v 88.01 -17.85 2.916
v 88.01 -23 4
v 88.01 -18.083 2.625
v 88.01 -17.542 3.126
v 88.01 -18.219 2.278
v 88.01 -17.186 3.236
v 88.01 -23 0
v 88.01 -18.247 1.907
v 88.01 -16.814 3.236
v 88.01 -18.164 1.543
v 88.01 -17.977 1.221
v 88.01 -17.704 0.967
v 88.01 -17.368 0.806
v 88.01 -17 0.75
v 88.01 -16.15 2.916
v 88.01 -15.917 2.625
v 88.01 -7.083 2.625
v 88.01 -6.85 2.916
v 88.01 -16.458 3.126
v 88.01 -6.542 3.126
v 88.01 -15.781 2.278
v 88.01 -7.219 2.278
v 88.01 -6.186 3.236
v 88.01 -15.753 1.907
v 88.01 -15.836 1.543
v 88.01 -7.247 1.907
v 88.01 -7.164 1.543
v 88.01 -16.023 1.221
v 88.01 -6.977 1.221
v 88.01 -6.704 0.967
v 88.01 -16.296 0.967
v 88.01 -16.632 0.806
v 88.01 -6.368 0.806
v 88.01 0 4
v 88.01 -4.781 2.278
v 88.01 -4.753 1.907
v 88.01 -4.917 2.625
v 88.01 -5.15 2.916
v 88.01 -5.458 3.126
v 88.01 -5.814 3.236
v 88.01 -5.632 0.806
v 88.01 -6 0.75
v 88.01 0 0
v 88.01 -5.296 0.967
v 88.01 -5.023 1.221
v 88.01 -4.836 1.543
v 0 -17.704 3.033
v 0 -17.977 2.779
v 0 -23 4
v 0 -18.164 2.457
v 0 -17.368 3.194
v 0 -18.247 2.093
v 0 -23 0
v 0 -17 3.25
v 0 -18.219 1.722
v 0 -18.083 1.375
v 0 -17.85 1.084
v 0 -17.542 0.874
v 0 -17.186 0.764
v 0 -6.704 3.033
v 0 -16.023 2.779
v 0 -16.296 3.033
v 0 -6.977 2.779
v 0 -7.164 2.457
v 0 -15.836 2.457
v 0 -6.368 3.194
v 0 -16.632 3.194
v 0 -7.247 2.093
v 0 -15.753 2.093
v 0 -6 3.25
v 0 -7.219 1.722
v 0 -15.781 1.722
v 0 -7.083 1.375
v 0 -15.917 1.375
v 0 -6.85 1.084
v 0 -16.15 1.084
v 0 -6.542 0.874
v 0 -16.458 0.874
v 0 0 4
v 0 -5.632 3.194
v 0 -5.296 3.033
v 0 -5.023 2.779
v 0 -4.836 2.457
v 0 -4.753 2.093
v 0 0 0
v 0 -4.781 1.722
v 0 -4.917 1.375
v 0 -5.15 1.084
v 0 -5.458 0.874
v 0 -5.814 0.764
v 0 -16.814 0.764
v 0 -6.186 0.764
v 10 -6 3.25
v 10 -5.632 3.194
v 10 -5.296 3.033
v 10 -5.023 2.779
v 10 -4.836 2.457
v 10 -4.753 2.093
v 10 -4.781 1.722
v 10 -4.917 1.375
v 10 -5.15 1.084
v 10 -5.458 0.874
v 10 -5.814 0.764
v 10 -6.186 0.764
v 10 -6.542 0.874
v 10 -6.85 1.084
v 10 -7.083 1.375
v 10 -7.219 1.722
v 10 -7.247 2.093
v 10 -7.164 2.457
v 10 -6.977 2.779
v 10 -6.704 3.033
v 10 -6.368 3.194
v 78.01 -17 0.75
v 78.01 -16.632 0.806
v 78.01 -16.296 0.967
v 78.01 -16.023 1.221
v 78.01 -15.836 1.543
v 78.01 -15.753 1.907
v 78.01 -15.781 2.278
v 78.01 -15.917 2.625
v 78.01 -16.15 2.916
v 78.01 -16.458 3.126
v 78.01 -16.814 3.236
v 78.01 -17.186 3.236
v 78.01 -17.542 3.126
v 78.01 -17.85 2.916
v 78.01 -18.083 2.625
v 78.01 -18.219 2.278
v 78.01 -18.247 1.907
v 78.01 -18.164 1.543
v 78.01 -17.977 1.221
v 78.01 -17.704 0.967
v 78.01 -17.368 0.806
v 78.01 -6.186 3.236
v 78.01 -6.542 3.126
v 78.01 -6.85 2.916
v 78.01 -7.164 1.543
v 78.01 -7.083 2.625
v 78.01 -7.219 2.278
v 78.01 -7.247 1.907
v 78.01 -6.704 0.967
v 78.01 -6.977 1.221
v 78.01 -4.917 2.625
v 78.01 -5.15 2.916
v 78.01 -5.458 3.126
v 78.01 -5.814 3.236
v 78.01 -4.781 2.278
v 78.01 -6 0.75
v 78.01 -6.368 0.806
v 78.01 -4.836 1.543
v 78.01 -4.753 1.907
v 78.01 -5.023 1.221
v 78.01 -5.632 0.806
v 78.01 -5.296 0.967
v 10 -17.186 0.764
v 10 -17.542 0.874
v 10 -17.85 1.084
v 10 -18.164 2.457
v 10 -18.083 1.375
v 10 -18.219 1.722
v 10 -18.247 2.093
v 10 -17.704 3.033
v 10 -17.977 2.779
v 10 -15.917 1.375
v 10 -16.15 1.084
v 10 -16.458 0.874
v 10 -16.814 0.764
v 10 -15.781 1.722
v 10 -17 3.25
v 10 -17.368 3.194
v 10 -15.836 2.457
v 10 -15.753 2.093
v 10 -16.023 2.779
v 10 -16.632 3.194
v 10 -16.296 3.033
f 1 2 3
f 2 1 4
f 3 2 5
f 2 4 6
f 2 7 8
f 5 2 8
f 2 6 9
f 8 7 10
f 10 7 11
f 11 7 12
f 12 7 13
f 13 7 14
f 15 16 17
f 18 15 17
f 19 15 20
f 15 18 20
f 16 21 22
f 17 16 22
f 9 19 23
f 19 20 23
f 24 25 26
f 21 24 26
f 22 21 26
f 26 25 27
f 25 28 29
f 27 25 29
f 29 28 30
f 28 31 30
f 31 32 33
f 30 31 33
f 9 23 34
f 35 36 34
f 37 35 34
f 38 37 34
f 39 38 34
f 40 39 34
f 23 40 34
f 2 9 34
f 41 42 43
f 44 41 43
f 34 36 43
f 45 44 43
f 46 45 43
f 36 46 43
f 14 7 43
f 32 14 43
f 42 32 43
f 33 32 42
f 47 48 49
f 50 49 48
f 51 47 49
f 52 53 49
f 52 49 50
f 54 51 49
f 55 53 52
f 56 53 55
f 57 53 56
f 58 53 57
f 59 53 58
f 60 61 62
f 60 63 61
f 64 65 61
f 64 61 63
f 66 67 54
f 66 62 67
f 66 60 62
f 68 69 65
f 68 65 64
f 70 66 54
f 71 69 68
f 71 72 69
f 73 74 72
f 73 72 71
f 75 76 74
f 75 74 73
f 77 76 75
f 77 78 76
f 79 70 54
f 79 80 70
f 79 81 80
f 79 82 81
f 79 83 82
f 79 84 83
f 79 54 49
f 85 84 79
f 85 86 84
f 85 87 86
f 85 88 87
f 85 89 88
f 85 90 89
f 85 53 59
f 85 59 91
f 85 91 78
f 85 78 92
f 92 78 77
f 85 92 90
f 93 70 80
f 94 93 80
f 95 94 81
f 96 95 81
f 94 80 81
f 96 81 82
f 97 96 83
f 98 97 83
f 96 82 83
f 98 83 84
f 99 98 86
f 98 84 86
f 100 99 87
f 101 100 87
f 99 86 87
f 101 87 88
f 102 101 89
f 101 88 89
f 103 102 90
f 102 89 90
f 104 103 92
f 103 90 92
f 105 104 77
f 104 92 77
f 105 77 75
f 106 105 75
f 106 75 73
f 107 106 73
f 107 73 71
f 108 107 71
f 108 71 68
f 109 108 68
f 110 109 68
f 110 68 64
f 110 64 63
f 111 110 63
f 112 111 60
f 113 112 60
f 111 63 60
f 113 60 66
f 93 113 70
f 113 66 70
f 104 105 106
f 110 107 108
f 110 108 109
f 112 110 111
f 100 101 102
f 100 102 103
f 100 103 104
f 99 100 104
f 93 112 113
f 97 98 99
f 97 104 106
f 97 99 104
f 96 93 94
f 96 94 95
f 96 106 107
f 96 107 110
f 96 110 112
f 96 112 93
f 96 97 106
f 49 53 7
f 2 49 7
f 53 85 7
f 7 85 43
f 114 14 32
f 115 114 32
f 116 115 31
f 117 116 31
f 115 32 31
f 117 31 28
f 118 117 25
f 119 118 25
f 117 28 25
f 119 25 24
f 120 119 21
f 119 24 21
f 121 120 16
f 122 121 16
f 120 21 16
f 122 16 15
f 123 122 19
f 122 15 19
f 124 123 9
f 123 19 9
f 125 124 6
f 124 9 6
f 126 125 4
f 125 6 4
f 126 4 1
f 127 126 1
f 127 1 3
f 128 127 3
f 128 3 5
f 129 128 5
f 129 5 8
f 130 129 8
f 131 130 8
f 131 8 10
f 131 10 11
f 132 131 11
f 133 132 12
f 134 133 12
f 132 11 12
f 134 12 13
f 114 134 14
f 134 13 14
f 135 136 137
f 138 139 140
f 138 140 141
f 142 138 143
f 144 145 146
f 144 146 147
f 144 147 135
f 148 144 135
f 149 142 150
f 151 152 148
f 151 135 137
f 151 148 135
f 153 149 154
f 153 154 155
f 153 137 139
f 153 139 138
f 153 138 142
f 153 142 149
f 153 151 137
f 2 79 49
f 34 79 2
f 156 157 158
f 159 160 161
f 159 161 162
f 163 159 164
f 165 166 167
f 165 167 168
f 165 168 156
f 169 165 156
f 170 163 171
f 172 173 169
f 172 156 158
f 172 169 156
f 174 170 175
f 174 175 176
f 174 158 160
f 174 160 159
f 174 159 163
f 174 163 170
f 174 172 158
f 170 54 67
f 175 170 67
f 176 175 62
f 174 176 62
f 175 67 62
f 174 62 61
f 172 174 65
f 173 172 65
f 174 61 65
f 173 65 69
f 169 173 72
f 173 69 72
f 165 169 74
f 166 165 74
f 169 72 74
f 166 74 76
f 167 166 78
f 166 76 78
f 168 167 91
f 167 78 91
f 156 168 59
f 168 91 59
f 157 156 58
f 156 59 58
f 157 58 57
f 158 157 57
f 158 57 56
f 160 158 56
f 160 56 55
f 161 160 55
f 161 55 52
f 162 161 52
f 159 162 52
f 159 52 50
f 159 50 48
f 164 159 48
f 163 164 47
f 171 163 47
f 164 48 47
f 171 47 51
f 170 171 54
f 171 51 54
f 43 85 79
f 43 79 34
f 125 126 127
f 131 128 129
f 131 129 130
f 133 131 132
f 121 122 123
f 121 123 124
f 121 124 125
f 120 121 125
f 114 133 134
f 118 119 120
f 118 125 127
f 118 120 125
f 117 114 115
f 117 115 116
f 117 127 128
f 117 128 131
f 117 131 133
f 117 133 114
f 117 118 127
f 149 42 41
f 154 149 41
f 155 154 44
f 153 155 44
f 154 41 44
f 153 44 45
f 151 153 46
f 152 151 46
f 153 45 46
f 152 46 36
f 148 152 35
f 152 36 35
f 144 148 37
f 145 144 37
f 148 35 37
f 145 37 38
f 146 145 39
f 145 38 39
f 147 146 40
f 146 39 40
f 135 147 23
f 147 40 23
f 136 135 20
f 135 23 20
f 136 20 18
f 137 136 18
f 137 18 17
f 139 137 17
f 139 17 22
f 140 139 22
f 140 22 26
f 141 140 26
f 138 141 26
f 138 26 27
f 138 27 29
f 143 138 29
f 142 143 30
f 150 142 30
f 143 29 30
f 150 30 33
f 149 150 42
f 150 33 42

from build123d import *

# Parameters (mm, degrees)
ESBO_O1_W                = 88.01
ESBO_O1_H                = 23
RESSALTO_EXTRUS_O1_DEPTH = 4
ESBO_O2_R                = 1.25
CORTE_EXTRUS_O1_DEPTH    = 10
ESBO_O3_R                = 1.25
CORTE_EXTRUS_O2_DEPTH    = 10


with BuildPart() as part:
    # Esboço1 → Ressalto-extrusão1 (new body)
    with BuildSketch(Plane.XY):
        with Locations((44.005, -11.5)):
            Rectangle(ESBO_O1_W, ESBO_O1_H)
    extrude(amount=RESSALTO_EXTRUS_O1_DEPTH)

    # Esboço2 → Corte-extrusão1 (cut)
    with BuildSketch(Plane.ZY):
        with Locations((2, -6)):
            Circle(ESBO_O2_R)
        with Locations((2, -17)):
            Circle(ESBO_O2_R)
    extrude(amount=-CORTE_EXTRUS_O1_DEPTH, mode=Mode.SUBTRACT)

    # Esboço3 → Corte-extrusão2 (cut)
    with BuildSketch(Plane(origin=(88.01, 0, 0), x_dir=(0, 0, -1), z_dir=(1, 0, 0))):
        with Locations((-2, -6)):
            Circle(ESBO_O3_R)
        with Locations((-2, -17)):
            Circle(ESBO_O3_R)
    extrude(amount=-CORTE_EXTRUS_O2_DEPTH, mode=Mode.SUBTRACT)


solid = part.part
